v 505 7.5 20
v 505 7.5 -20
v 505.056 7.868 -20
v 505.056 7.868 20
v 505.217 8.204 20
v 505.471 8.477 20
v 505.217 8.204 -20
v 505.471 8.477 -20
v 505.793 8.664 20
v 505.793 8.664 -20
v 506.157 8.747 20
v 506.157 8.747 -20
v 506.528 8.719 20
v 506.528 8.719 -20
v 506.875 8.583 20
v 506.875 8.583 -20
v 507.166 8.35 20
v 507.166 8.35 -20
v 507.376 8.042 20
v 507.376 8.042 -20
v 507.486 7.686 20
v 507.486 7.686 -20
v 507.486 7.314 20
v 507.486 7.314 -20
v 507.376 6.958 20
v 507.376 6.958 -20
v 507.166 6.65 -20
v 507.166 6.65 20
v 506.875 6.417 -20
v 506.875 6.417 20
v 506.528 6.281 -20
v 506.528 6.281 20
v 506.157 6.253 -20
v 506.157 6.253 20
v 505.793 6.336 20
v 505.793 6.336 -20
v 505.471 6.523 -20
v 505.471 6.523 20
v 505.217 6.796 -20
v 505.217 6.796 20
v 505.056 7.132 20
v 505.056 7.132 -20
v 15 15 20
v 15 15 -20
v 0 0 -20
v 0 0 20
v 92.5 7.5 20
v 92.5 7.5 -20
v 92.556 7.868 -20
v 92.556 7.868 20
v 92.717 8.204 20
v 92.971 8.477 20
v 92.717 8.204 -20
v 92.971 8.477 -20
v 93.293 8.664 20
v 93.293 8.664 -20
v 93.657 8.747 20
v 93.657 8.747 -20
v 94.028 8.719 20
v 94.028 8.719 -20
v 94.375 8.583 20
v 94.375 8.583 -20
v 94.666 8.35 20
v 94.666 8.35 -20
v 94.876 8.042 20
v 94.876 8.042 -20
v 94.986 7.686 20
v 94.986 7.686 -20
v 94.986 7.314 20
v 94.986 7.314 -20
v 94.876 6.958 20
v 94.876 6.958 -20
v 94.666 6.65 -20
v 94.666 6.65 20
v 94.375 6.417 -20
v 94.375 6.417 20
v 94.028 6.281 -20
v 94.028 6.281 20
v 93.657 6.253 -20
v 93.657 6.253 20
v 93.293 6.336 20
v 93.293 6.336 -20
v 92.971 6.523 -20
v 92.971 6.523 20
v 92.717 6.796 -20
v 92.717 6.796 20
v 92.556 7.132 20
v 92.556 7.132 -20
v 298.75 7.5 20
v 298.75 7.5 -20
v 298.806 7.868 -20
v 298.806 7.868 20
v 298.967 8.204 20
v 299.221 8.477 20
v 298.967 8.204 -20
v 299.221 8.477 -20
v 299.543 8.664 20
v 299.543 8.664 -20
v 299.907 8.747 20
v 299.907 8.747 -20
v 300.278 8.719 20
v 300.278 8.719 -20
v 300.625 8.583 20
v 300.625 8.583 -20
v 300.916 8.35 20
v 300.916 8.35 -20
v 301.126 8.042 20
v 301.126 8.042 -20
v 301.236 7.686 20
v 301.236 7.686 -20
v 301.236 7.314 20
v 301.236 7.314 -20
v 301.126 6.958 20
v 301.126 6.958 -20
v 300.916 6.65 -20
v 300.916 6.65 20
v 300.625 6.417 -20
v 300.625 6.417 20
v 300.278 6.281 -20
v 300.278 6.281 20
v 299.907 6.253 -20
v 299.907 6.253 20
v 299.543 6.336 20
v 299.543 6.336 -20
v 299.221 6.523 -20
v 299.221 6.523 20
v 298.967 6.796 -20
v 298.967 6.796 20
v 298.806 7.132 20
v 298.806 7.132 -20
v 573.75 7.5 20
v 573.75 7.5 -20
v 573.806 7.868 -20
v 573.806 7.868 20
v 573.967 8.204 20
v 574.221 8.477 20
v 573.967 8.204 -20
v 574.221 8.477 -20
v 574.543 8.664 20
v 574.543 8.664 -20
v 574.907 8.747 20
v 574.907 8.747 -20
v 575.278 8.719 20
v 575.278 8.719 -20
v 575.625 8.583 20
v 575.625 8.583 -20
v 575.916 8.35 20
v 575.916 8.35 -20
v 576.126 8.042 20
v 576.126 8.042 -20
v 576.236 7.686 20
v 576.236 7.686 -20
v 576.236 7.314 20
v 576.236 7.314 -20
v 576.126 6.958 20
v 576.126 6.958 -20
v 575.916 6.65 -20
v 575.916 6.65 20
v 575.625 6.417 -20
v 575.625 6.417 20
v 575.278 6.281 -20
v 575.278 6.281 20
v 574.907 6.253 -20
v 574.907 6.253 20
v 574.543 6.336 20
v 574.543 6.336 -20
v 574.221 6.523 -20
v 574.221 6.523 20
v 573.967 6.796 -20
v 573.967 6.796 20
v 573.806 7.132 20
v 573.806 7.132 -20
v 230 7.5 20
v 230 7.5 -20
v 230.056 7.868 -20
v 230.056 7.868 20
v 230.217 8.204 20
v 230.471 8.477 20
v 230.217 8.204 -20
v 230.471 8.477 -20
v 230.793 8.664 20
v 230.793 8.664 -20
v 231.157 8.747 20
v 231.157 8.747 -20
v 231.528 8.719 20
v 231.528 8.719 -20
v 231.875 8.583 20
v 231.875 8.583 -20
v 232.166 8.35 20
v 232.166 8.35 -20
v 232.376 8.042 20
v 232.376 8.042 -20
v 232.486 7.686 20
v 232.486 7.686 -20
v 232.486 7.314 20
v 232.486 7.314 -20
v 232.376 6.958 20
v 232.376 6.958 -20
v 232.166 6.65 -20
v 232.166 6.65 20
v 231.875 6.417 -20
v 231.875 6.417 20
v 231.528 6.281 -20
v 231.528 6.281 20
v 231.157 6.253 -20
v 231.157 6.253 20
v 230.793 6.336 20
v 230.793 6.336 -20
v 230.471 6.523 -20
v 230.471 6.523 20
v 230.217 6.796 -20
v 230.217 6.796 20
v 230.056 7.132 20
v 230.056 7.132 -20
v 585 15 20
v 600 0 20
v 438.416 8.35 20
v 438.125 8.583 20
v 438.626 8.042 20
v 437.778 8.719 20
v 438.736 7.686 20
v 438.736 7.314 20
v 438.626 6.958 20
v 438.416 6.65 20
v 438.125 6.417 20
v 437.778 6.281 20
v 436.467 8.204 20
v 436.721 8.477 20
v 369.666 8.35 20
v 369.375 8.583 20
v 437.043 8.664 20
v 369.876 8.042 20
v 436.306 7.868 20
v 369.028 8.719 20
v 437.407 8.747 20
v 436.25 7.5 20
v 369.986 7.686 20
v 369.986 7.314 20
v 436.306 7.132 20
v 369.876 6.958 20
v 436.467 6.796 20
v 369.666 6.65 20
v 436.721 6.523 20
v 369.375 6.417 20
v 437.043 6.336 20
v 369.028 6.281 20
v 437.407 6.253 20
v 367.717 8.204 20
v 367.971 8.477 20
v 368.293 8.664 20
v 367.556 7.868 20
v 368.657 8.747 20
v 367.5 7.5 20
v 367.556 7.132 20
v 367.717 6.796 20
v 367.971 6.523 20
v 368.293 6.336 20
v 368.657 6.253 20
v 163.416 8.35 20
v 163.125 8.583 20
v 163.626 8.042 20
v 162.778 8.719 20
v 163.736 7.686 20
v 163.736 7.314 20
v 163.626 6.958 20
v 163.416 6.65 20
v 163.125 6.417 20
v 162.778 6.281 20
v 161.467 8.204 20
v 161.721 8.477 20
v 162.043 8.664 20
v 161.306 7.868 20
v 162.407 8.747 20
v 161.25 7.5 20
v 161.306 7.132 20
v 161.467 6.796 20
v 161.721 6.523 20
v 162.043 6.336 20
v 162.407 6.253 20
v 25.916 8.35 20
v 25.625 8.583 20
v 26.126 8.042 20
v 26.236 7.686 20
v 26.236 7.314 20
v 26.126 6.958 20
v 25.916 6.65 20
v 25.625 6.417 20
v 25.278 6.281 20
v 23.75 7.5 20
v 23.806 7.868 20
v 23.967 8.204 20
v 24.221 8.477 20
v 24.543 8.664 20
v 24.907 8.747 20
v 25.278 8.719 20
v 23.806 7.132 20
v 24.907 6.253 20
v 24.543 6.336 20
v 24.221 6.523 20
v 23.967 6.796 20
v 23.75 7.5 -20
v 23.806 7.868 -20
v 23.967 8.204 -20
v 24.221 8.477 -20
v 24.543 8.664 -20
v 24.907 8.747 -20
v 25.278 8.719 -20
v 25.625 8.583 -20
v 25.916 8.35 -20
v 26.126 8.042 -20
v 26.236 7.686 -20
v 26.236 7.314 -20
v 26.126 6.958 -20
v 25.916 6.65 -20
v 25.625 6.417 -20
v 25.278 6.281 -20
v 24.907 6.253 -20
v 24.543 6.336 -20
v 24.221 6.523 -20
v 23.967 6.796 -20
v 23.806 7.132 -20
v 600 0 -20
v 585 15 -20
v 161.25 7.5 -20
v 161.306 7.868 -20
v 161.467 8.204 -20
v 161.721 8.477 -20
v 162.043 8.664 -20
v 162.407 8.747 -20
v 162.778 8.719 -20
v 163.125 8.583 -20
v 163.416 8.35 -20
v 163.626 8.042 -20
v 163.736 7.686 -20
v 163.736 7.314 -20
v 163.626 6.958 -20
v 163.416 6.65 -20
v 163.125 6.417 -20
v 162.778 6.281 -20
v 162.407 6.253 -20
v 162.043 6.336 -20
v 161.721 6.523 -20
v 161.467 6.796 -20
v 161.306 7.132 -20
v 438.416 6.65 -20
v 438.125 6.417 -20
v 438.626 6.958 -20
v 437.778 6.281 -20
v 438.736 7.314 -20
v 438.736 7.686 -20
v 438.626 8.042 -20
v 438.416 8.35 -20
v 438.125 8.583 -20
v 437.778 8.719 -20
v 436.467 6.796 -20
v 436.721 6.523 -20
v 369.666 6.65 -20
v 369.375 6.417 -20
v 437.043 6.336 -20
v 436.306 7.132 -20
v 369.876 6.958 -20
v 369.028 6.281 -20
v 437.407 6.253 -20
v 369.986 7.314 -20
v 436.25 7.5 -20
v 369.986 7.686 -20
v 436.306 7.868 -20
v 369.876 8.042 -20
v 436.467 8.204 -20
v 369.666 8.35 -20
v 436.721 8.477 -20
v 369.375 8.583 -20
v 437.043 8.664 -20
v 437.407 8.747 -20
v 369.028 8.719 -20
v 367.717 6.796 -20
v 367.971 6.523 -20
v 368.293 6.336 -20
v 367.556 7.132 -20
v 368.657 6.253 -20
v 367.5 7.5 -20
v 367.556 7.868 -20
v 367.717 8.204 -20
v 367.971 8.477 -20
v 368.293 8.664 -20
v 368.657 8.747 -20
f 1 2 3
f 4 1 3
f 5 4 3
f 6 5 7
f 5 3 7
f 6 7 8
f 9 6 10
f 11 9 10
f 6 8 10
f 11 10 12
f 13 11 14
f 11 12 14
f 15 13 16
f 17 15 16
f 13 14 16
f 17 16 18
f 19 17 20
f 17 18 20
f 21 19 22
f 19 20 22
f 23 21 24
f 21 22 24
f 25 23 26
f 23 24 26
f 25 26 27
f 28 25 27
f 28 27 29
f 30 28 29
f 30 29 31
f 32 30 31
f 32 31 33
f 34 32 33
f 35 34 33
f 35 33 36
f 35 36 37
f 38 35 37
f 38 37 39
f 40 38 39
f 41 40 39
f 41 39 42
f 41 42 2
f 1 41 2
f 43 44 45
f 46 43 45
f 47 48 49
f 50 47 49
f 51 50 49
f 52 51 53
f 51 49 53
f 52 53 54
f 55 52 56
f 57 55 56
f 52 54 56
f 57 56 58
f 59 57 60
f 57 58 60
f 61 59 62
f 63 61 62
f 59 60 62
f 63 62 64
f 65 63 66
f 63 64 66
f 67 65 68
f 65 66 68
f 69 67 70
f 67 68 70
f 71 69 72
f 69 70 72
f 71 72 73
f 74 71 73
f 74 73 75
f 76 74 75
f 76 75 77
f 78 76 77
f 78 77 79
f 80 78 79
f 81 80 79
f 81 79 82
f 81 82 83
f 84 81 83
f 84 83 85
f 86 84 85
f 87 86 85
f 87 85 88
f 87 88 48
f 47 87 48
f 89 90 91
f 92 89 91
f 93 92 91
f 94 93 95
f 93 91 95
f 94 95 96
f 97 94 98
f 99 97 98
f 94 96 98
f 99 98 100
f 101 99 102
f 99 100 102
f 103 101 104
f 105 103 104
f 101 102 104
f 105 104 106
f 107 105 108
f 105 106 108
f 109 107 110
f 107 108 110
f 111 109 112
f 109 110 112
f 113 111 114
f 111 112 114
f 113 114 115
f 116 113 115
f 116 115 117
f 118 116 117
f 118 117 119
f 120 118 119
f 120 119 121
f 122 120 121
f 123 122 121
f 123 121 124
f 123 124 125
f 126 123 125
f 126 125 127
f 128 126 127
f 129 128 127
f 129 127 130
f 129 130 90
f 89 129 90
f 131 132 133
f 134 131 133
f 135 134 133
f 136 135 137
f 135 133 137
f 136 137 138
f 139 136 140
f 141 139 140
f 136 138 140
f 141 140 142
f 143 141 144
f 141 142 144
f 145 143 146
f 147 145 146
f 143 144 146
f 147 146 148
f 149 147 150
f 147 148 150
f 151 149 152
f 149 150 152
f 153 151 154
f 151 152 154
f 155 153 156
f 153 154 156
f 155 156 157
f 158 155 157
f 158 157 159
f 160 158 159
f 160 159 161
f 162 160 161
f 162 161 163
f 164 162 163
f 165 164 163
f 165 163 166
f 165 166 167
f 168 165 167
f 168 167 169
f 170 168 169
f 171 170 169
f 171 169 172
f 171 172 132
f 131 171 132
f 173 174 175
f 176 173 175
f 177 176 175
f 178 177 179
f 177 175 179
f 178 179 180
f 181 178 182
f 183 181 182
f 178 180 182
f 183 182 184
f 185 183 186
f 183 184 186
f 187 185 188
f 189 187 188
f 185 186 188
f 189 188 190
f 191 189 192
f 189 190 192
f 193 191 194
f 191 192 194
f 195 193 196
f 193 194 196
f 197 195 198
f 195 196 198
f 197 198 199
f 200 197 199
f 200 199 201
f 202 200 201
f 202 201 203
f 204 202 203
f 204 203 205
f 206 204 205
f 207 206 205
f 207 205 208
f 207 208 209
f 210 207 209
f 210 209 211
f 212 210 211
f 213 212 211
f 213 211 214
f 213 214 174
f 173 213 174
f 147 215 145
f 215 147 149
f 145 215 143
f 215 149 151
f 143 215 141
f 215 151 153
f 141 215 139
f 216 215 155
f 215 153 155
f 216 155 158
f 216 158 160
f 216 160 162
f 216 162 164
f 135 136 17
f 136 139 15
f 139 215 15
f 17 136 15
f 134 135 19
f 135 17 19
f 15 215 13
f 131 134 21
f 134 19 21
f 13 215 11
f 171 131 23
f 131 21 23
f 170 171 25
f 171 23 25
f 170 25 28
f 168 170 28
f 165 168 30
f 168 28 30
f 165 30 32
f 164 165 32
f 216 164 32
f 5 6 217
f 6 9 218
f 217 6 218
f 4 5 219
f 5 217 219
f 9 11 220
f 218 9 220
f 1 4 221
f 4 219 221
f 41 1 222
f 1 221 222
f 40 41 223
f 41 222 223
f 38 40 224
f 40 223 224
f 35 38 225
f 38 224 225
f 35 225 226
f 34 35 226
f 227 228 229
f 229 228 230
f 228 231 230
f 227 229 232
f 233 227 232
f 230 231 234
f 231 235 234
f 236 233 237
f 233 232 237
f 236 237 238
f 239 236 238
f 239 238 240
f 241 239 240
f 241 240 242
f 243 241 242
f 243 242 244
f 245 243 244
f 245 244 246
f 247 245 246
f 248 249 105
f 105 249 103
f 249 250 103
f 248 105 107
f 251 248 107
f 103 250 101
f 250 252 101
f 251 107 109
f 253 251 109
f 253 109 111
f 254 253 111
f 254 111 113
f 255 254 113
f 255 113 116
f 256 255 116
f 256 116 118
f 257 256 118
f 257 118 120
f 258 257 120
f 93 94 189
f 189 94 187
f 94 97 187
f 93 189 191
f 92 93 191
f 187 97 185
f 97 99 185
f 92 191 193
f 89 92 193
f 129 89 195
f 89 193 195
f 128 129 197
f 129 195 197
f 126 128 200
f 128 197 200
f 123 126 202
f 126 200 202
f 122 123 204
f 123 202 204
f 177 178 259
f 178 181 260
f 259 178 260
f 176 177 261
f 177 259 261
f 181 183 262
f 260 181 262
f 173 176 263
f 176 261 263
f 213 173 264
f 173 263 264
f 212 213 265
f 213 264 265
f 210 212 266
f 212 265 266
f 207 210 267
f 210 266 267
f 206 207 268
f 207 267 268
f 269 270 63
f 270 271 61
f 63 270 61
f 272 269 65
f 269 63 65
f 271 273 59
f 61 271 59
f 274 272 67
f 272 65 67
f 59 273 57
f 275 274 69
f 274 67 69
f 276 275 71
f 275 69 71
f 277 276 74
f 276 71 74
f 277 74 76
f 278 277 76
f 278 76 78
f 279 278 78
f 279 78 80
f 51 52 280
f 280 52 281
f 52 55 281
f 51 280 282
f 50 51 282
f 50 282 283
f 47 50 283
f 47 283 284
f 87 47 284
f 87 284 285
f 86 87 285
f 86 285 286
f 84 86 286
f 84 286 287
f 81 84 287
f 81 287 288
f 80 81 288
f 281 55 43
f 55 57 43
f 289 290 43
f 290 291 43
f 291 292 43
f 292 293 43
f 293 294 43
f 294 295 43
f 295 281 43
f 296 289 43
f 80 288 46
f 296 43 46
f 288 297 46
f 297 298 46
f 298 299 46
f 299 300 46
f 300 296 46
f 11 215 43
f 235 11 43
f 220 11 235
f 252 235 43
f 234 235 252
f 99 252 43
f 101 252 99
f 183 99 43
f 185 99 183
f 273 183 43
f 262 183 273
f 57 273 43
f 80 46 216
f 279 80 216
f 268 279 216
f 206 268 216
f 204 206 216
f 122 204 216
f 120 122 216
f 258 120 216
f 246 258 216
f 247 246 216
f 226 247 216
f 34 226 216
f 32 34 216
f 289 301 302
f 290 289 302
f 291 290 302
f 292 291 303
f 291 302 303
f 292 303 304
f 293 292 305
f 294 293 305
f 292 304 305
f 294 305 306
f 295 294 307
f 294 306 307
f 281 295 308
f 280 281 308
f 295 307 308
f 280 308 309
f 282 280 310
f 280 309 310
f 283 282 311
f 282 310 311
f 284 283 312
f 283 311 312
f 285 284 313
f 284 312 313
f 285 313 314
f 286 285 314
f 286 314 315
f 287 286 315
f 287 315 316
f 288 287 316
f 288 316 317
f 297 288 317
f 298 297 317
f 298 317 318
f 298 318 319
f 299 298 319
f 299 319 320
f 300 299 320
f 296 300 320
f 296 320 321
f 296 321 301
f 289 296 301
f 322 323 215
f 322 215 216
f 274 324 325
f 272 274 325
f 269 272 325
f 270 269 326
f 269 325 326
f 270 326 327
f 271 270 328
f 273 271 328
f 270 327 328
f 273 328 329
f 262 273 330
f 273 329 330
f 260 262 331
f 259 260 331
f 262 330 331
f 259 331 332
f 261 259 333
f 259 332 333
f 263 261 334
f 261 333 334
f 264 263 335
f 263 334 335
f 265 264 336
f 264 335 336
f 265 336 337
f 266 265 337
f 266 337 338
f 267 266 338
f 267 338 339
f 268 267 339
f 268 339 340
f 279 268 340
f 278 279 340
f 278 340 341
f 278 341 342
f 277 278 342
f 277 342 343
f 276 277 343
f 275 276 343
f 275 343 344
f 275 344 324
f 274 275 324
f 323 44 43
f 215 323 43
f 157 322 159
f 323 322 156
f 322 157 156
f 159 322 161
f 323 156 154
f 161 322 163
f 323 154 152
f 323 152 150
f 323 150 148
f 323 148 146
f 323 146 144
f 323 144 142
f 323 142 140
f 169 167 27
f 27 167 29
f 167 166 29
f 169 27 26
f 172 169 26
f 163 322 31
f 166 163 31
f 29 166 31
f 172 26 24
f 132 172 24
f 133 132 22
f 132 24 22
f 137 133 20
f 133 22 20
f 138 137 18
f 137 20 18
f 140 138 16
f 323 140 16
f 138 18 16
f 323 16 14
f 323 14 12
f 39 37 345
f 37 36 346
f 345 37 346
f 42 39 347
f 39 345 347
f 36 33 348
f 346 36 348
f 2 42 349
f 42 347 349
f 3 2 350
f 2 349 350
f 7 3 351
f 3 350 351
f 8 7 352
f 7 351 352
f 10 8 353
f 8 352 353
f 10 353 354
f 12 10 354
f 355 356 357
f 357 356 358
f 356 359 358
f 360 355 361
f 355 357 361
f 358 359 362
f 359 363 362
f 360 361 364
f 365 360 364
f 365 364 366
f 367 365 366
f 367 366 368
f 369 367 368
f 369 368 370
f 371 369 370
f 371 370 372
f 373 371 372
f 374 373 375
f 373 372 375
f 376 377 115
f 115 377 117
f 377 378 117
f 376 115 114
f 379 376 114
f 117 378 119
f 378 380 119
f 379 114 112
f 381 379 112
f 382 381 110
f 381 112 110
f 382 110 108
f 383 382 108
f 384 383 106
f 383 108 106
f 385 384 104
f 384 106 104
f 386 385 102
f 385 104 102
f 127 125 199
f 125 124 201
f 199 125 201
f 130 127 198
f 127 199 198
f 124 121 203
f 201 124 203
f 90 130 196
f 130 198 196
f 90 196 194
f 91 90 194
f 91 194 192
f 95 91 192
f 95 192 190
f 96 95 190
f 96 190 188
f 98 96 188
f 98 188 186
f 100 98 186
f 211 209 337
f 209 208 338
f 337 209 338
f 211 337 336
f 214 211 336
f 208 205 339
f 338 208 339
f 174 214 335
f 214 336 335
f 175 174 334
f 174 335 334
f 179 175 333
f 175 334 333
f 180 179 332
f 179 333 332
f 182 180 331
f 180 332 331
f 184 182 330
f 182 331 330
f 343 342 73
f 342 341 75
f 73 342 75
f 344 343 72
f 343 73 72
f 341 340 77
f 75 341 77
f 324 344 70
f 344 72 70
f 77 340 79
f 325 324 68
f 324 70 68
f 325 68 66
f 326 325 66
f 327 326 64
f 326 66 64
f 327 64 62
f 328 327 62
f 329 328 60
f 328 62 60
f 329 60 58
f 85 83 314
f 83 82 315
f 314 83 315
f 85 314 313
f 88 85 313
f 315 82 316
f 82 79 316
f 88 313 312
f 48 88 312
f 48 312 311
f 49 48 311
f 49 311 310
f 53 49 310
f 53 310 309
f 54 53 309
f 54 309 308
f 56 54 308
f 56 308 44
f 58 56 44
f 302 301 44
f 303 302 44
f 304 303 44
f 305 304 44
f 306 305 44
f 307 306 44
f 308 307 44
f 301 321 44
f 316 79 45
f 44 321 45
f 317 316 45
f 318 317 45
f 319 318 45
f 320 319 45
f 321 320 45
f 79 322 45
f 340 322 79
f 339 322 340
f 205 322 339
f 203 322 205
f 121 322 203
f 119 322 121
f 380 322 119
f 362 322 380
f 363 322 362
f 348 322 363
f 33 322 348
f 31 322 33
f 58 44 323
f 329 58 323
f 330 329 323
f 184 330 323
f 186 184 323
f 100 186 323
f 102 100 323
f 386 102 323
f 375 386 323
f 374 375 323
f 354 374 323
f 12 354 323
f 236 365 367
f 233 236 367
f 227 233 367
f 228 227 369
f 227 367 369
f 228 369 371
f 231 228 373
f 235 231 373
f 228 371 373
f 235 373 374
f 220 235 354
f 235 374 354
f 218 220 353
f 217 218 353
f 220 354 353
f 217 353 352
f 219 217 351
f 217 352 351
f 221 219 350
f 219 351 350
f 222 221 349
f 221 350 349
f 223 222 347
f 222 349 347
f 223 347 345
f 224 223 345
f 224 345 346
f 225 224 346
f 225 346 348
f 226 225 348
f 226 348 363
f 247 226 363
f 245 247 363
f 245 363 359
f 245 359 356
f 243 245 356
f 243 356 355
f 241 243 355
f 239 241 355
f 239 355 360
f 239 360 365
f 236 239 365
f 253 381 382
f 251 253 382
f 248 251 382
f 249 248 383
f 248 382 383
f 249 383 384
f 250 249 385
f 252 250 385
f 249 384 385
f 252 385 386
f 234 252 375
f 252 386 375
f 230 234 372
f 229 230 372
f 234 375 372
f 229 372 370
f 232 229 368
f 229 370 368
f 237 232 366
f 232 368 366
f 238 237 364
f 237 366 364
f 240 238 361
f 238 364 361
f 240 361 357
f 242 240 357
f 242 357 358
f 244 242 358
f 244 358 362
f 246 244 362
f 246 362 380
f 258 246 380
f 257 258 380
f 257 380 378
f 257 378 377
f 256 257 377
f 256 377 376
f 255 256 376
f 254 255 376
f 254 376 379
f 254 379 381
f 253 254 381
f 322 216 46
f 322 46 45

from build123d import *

# Parameters (mm, degrees)
SALIENTE_EXTRUIR1_DEPTH = 600
CROQUIS2_R              = 1.25
CORTAR_EXTRUIR1_DEPTH   = 41


with BuildPart() as part:
    # Croquis1 → Saliente-Extruir1 (new body)
    with BuildSketch(Plane(origin=(0, 0, 0), x_dir=(0, 0, -1), z_dir=(1, 0, 0))):
        Polygon((-20, 0), (20, 0), (20, 15), (18.5, 15), (-18.5, 15), (-20, 15), align=None)
    extrude(amount=SALIENTE_EXTRUIR1_DEPTH)

    # Croquis2 → Cortar-Extruir1 (cut, through all)
    with BuildSketch(Plane(origin=(0, 0, -20), x_dir=(-1, 0, 0), z_dir=(0, 0, -1))):
        with Locations((-25, 7.5)):
            Circle(CROQUIS2_R)
        with Locations((-93.75, 7.5)):
            Circle(CROQUIS2_R)
        with Locations((-162.5, 7.5)):
            Circle(CROQUIS2_R)
        with Locations((-231.25, 7.5)):
            Circle(CROQUIS2_R)
        with Locations((-368.75, 7.5)):
            Circle(CROQUIS2_R)
        with Locations((-437.5, 7.5)):
            Circle(CROQUIS2_R)
        with Locations((-506.25, 7.5)):
            Circle(CROQUIS2_R)
        with Locations((-575, 7.5)):
            Circle(CROQUIS2_R)
        with Locations((-300, 7.5)):
            Circle(CROQUIS2_R)
        Polygon((-600, 15), (-585, 15), (-600, 0), align=None)
        Polygon((0, 15), (-15, 15), (0, 0), align=None)
    extrude(amount=-CORTAR_EXTRUIR1_DEPTH, mode=Mode.SUBTRACT)


solid = part.part
